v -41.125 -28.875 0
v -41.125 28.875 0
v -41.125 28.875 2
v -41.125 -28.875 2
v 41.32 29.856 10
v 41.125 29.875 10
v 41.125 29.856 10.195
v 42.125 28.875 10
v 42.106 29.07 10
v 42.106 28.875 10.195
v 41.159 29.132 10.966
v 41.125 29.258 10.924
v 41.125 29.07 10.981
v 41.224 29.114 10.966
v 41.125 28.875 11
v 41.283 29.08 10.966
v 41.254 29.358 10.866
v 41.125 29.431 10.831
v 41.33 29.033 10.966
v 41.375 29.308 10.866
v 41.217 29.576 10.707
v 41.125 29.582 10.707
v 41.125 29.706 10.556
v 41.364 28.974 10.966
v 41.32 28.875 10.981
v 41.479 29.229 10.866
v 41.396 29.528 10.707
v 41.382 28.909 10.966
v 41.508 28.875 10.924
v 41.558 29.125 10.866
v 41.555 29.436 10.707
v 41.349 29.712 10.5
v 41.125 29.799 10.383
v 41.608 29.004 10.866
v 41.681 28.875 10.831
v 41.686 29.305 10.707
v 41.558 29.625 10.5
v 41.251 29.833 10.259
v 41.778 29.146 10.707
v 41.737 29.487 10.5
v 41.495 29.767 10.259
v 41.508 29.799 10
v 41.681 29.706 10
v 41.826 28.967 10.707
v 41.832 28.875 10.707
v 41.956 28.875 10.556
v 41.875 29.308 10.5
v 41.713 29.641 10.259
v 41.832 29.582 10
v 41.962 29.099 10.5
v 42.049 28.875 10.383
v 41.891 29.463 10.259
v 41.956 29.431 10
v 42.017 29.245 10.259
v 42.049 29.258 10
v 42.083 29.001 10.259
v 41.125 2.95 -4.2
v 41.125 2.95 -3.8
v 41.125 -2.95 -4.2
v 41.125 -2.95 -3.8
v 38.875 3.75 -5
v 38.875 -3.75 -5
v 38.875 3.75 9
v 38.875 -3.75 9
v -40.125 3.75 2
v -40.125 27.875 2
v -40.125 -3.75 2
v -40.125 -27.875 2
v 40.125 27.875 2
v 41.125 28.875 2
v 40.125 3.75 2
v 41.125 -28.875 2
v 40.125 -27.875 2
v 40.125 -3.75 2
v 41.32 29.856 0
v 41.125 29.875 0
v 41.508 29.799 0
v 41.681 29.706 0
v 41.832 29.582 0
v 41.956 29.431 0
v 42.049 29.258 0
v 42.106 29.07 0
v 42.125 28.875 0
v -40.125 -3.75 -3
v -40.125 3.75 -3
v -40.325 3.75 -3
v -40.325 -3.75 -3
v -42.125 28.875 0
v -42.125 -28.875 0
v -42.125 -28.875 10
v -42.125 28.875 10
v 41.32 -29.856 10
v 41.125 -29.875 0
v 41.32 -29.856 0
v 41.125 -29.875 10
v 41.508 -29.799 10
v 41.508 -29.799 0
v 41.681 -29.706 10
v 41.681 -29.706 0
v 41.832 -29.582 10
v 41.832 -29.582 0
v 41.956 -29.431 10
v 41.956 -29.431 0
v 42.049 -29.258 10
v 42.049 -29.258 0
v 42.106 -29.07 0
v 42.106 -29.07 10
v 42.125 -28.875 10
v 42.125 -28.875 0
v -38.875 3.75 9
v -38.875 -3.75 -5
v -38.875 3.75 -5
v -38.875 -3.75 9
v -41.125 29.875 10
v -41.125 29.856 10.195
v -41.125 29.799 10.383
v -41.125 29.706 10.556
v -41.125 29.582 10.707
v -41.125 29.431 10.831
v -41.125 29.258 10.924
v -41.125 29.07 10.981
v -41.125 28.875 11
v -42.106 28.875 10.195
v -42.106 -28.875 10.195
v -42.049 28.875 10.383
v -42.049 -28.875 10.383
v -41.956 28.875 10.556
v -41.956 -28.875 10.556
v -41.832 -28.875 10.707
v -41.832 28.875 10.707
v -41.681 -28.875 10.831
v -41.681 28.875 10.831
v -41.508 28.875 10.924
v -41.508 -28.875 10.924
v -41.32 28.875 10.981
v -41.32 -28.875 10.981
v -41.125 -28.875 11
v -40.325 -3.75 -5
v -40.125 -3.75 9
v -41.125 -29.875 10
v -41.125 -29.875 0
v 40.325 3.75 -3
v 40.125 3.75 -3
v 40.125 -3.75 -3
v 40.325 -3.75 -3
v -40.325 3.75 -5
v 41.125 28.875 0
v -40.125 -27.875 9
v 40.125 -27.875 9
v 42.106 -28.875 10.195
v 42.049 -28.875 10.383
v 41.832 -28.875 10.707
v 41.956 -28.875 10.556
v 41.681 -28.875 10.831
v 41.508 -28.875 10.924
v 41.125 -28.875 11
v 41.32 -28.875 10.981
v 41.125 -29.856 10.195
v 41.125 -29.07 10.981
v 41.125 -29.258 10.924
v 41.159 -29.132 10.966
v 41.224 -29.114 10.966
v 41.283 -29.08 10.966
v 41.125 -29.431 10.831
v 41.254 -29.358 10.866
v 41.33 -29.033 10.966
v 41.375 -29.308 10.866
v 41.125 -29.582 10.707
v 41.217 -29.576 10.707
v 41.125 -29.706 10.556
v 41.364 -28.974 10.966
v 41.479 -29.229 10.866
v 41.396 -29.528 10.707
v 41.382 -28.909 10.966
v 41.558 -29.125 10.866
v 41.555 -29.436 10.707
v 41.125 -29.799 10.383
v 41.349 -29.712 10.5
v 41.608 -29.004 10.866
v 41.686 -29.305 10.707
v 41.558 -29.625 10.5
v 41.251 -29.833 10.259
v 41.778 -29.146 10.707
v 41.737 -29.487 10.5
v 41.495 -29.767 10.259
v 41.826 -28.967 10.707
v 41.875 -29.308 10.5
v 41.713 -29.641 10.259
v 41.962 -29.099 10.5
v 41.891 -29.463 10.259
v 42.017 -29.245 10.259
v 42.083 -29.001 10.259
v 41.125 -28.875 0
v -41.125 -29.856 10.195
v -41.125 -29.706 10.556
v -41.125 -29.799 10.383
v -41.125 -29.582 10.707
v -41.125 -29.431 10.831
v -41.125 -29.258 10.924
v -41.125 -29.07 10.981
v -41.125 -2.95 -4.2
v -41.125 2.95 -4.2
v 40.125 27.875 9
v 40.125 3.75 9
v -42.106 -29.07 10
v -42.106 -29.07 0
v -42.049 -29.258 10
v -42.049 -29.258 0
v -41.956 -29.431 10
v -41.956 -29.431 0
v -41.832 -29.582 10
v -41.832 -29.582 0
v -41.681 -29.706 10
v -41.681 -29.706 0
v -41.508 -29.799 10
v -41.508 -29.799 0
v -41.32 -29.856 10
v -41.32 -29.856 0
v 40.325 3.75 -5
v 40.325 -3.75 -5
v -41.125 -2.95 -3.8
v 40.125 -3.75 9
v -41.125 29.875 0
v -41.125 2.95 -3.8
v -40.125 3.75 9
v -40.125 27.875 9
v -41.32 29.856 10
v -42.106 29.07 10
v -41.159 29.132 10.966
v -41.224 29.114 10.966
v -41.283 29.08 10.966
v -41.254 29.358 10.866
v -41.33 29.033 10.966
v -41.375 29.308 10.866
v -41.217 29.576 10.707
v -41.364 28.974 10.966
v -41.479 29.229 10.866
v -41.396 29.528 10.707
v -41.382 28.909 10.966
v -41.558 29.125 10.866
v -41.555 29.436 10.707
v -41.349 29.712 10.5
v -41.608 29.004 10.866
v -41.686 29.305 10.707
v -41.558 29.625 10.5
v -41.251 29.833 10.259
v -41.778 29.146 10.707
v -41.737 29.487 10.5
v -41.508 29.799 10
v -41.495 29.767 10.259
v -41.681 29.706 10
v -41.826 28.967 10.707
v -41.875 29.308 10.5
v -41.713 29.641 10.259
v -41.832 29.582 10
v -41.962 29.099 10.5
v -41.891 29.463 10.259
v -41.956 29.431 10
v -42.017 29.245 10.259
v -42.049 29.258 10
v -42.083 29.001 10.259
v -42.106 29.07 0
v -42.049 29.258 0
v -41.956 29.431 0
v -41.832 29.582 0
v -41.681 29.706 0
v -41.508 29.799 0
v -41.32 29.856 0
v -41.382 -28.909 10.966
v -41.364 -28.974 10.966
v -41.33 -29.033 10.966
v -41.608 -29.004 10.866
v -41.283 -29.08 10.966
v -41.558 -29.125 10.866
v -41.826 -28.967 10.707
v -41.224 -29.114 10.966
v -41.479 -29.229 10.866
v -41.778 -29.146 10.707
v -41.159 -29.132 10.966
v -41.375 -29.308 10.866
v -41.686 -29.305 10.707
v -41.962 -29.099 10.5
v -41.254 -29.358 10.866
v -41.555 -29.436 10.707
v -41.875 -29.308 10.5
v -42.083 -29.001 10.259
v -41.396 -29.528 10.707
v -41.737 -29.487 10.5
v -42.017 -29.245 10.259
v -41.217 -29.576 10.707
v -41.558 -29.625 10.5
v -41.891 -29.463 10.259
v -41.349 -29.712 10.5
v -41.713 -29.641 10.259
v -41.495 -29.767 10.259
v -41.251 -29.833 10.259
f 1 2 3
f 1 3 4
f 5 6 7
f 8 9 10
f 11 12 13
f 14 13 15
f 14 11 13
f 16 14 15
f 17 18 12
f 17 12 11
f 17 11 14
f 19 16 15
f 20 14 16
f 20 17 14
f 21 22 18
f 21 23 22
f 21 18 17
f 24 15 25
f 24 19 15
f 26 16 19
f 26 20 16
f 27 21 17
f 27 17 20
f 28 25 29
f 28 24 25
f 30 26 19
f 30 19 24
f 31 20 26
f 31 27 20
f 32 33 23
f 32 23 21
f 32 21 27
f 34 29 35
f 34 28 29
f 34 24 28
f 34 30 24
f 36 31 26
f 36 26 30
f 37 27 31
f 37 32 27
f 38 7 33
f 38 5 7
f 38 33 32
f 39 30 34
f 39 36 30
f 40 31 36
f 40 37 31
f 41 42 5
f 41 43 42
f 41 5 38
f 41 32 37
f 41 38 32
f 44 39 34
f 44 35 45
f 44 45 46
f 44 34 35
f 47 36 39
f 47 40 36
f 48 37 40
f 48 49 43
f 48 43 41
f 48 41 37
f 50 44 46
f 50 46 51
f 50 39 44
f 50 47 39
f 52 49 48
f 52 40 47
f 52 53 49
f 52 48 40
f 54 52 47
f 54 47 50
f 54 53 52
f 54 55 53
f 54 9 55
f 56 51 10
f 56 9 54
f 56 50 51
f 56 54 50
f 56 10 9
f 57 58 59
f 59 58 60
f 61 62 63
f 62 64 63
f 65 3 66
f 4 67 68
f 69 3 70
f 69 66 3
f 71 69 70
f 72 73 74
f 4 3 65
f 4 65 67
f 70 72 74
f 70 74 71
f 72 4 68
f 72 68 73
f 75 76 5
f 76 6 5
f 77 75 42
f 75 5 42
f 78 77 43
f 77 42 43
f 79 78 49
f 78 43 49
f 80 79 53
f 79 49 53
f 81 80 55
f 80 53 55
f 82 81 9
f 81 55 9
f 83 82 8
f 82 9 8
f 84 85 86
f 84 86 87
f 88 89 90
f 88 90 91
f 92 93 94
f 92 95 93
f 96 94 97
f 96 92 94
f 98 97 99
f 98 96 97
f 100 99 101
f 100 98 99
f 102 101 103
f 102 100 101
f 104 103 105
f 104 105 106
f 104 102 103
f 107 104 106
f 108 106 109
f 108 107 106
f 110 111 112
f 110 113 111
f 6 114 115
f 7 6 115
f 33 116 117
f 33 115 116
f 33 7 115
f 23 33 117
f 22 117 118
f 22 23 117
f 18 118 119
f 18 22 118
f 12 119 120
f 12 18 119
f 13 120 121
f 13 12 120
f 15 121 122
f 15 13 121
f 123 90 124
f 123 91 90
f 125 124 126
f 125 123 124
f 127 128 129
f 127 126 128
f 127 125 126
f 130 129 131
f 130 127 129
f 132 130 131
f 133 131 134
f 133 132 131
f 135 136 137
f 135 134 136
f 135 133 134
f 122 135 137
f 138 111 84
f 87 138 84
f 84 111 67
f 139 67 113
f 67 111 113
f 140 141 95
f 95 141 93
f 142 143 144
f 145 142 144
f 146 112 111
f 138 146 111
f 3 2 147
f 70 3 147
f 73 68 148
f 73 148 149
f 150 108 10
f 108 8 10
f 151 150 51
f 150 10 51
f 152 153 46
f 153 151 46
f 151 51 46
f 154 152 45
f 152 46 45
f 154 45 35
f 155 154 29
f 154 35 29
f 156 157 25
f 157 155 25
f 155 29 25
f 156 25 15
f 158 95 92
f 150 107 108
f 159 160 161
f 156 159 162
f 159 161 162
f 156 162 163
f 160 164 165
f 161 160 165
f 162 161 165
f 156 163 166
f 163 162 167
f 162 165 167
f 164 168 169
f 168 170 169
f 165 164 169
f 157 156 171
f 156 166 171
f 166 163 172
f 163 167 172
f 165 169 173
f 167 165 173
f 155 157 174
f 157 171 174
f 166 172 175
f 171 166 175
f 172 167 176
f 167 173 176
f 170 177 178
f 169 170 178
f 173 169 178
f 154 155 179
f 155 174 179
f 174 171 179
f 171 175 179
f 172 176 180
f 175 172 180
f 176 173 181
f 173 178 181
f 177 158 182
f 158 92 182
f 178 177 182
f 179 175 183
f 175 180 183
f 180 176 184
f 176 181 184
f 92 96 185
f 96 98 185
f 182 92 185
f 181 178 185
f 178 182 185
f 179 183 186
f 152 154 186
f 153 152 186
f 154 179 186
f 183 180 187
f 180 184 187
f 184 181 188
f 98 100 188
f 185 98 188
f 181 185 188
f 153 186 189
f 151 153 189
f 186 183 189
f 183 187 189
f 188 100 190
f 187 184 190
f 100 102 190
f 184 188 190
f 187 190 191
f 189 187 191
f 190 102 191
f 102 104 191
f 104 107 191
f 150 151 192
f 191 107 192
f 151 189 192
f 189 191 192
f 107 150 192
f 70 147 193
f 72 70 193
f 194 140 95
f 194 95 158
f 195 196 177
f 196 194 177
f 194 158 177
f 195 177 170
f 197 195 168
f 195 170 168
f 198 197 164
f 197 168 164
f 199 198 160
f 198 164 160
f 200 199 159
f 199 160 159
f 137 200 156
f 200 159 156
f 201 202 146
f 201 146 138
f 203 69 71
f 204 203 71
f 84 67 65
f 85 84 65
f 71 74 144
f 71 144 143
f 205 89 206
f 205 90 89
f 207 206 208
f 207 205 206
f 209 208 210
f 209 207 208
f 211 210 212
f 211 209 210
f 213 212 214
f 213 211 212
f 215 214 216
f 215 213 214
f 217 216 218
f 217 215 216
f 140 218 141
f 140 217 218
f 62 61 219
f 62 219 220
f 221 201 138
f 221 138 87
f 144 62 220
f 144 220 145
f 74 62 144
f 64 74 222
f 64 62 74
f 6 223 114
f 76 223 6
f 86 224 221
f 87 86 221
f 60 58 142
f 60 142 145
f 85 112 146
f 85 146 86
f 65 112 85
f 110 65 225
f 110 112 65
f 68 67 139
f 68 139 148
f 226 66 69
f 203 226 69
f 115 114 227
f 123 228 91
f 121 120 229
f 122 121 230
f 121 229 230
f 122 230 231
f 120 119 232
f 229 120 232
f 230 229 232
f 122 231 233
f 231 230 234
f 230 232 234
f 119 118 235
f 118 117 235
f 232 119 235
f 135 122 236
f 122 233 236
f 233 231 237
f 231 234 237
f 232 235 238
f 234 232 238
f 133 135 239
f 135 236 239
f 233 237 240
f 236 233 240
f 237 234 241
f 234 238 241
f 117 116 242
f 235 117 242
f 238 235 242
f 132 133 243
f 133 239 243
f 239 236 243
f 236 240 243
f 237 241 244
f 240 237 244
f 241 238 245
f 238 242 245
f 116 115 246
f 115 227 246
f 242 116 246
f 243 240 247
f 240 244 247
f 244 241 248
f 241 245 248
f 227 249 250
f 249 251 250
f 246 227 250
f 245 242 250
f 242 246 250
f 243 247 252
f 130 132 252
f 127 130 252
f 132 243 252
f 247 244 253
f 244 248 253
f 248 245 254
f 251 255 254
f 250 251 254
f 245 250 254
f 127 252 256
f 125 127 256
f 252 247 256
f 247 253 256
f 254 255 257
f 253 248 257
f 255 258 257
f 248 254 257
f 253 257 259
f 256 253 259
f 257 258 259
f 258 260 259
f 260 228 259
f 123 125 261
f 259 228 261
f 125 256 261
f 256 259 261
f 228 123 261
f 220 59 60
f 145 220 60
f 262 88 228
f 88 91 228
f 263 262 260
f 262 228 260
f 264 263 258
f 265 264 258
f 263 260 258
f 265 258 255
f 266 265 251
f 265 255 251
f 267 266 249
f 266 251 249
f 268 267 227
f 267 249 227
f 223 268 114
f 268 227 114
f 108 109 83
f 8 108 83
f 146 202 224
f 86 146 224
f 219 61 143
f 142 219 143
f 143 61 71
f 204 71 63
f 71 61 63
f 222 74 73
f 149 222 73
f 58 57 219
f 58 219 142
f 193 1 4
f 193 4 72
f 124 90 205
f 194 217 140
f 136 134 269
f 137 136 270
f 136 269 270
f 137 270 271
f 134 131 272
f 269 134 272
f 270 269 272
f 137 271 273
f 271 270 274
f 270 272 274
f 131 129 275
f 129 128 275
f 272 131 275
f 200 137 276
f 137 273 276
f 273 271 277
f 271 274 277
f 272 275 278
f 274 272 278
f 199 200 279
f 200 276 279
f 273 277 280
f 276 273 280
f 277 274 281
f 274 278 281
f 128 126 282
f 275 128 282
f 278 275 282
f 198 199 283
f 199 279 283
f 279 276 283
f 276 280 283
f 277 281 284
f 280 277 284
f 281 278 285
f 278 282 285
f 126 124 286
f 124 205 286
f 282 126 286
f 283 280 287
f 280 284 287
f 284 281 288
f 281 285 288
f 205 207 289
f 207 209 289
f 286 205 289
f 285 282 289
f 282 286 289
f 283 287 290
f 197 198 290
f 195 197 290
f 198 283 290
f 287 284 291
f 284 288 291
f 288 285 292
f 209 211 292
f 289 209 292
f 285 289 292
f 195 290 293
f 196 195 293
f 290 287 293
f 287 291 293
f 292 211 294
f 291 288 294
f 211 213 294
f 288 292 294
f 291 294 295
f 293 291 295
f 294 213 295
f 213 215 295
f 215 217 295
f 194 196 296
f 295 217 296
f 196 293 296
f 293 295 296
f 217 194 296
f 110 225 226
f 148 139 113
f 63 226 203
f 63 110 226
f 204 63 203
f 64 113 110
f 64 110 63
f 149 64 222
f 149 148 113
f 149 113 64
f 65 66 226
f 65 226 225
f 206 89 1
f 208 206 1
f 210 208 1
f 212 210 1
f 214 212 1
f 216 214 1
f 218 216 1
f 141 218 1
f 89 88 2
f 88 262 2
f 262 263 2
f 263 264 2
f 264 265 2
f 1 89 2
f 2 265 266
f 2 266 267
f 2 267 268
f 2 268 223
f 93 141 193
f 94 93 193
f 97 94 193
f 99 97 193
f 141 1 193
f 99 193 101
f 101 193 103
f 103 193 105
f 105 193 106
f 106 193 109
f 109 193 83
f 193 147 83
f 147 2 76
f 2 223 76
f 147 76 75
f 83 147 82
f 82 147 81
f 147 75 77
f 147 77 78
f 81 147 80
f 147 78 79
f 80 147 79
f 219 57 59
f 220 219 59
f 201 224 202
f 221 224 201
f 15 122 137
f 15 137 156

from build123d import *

# Parameters (mm, degrees)
F0_W      = 84.25
F0_H      = 59.75
F1_DEPTH  = 11
F2_W      = 80.25
F2_H      = 55.75
F3_DEPTH  = 9
F4_W      = 82.25
F4_H      = 57.75
F4_W_2    = 80.25
F4_H_2    = 55.75
F5_DEPTH  = 2
F6_W      = 7.5
F6_H      = 7
F7_DEPTH  = 1.25
F8_R      = 1
F9_W      = 7.5
F9_H      = 2
F10_DEPTH = 1
F11_SIZE  = 0.8


with BuildPart() as f1:
    # F0 (on Top) → F1 (new body)
    with BuildSketch(Plane.XY):
        Rectangle(F0_W, F0_H)
    extrude(amount=F1_DEPTH)

    # F2 (on face) → F3 (cut)
    with BuildSketch(Plane(origin=(0, 0, 0), x_dir=(1, 0, 0), z_dir=(0, 0, -1))):
        Rectangle(F2_W, F2_H)
    extrude(amount=-F3_DEPTH, mode=Mode.SUBTRACT)

    # F4 (on face) → F5 (cut)
    with BuildSketch(Plane(origin=(0, 0, 0), x_dir=(1, 0, 0), z_dir=(0, 0, -1))):
        Rectangle(F4_W, F4_H)
        Rectangle(F4_W_2, F4_H_2, mode=Mode.SUBTRACT)
    extrude(amount=-F5_DEPTH, mode=Mode.SUBTRACT)

    # F6 (on face) → F7 (join)
    with BuildSketch(Plane.YZ.offset(-40.125)):
        with Locations((0, -1.5)):
            Rectangle(F6_W, F6_H)
        with Locations((0, 5.5)):
            Rectangle(F6_W, F6_H)
    extrude(amount=F7_DEPTH)

    # F8
    f8_edges = [f1.edges().sort_by_distance(p)[0] for p in [
        (-42.125, -29.875, 5.5),
        (42.125, -29.875, 5.5),
        (-42.125, 29.875, 5.5),
        (42.125, 29.875, 5.5),
        (0, 29.875, 11),
        (-42.125, 0, 11),
        (0, -29.875, 11),
        (42.125, 0, 11),
    ]]
    fillet(f8_edges, radius=F8_R)

    # F9 (on face) → F10 (join)
    with BuildSketch(Plane(origin=(-40.125, 0, 0), x_dir=(0, -1, 0), z_dir=(-1, 0, 0))):
        with Locations((0, -4)):
            Rectangle(F9_W, F9_H)
    extrude(amount=F10_DEPTH)

    # F11
    f11_edges = [f1.edges().sort_by_distance(p)[0] for p in [
        (-41.125, 0, -3),
        (-41.125, 3.75, -4),
        (-41.125, 0, -5),
        (-41.125, -3.75, -4),
    ]]
    chamfer(f11_edges, length=F11_SIZE)

    # F12: F1 across plane


with BuildPart() as f1_1:
    add(f1.part)
    add(f1.part.mirror(Plane.YZ))


solid = f1_1.part
